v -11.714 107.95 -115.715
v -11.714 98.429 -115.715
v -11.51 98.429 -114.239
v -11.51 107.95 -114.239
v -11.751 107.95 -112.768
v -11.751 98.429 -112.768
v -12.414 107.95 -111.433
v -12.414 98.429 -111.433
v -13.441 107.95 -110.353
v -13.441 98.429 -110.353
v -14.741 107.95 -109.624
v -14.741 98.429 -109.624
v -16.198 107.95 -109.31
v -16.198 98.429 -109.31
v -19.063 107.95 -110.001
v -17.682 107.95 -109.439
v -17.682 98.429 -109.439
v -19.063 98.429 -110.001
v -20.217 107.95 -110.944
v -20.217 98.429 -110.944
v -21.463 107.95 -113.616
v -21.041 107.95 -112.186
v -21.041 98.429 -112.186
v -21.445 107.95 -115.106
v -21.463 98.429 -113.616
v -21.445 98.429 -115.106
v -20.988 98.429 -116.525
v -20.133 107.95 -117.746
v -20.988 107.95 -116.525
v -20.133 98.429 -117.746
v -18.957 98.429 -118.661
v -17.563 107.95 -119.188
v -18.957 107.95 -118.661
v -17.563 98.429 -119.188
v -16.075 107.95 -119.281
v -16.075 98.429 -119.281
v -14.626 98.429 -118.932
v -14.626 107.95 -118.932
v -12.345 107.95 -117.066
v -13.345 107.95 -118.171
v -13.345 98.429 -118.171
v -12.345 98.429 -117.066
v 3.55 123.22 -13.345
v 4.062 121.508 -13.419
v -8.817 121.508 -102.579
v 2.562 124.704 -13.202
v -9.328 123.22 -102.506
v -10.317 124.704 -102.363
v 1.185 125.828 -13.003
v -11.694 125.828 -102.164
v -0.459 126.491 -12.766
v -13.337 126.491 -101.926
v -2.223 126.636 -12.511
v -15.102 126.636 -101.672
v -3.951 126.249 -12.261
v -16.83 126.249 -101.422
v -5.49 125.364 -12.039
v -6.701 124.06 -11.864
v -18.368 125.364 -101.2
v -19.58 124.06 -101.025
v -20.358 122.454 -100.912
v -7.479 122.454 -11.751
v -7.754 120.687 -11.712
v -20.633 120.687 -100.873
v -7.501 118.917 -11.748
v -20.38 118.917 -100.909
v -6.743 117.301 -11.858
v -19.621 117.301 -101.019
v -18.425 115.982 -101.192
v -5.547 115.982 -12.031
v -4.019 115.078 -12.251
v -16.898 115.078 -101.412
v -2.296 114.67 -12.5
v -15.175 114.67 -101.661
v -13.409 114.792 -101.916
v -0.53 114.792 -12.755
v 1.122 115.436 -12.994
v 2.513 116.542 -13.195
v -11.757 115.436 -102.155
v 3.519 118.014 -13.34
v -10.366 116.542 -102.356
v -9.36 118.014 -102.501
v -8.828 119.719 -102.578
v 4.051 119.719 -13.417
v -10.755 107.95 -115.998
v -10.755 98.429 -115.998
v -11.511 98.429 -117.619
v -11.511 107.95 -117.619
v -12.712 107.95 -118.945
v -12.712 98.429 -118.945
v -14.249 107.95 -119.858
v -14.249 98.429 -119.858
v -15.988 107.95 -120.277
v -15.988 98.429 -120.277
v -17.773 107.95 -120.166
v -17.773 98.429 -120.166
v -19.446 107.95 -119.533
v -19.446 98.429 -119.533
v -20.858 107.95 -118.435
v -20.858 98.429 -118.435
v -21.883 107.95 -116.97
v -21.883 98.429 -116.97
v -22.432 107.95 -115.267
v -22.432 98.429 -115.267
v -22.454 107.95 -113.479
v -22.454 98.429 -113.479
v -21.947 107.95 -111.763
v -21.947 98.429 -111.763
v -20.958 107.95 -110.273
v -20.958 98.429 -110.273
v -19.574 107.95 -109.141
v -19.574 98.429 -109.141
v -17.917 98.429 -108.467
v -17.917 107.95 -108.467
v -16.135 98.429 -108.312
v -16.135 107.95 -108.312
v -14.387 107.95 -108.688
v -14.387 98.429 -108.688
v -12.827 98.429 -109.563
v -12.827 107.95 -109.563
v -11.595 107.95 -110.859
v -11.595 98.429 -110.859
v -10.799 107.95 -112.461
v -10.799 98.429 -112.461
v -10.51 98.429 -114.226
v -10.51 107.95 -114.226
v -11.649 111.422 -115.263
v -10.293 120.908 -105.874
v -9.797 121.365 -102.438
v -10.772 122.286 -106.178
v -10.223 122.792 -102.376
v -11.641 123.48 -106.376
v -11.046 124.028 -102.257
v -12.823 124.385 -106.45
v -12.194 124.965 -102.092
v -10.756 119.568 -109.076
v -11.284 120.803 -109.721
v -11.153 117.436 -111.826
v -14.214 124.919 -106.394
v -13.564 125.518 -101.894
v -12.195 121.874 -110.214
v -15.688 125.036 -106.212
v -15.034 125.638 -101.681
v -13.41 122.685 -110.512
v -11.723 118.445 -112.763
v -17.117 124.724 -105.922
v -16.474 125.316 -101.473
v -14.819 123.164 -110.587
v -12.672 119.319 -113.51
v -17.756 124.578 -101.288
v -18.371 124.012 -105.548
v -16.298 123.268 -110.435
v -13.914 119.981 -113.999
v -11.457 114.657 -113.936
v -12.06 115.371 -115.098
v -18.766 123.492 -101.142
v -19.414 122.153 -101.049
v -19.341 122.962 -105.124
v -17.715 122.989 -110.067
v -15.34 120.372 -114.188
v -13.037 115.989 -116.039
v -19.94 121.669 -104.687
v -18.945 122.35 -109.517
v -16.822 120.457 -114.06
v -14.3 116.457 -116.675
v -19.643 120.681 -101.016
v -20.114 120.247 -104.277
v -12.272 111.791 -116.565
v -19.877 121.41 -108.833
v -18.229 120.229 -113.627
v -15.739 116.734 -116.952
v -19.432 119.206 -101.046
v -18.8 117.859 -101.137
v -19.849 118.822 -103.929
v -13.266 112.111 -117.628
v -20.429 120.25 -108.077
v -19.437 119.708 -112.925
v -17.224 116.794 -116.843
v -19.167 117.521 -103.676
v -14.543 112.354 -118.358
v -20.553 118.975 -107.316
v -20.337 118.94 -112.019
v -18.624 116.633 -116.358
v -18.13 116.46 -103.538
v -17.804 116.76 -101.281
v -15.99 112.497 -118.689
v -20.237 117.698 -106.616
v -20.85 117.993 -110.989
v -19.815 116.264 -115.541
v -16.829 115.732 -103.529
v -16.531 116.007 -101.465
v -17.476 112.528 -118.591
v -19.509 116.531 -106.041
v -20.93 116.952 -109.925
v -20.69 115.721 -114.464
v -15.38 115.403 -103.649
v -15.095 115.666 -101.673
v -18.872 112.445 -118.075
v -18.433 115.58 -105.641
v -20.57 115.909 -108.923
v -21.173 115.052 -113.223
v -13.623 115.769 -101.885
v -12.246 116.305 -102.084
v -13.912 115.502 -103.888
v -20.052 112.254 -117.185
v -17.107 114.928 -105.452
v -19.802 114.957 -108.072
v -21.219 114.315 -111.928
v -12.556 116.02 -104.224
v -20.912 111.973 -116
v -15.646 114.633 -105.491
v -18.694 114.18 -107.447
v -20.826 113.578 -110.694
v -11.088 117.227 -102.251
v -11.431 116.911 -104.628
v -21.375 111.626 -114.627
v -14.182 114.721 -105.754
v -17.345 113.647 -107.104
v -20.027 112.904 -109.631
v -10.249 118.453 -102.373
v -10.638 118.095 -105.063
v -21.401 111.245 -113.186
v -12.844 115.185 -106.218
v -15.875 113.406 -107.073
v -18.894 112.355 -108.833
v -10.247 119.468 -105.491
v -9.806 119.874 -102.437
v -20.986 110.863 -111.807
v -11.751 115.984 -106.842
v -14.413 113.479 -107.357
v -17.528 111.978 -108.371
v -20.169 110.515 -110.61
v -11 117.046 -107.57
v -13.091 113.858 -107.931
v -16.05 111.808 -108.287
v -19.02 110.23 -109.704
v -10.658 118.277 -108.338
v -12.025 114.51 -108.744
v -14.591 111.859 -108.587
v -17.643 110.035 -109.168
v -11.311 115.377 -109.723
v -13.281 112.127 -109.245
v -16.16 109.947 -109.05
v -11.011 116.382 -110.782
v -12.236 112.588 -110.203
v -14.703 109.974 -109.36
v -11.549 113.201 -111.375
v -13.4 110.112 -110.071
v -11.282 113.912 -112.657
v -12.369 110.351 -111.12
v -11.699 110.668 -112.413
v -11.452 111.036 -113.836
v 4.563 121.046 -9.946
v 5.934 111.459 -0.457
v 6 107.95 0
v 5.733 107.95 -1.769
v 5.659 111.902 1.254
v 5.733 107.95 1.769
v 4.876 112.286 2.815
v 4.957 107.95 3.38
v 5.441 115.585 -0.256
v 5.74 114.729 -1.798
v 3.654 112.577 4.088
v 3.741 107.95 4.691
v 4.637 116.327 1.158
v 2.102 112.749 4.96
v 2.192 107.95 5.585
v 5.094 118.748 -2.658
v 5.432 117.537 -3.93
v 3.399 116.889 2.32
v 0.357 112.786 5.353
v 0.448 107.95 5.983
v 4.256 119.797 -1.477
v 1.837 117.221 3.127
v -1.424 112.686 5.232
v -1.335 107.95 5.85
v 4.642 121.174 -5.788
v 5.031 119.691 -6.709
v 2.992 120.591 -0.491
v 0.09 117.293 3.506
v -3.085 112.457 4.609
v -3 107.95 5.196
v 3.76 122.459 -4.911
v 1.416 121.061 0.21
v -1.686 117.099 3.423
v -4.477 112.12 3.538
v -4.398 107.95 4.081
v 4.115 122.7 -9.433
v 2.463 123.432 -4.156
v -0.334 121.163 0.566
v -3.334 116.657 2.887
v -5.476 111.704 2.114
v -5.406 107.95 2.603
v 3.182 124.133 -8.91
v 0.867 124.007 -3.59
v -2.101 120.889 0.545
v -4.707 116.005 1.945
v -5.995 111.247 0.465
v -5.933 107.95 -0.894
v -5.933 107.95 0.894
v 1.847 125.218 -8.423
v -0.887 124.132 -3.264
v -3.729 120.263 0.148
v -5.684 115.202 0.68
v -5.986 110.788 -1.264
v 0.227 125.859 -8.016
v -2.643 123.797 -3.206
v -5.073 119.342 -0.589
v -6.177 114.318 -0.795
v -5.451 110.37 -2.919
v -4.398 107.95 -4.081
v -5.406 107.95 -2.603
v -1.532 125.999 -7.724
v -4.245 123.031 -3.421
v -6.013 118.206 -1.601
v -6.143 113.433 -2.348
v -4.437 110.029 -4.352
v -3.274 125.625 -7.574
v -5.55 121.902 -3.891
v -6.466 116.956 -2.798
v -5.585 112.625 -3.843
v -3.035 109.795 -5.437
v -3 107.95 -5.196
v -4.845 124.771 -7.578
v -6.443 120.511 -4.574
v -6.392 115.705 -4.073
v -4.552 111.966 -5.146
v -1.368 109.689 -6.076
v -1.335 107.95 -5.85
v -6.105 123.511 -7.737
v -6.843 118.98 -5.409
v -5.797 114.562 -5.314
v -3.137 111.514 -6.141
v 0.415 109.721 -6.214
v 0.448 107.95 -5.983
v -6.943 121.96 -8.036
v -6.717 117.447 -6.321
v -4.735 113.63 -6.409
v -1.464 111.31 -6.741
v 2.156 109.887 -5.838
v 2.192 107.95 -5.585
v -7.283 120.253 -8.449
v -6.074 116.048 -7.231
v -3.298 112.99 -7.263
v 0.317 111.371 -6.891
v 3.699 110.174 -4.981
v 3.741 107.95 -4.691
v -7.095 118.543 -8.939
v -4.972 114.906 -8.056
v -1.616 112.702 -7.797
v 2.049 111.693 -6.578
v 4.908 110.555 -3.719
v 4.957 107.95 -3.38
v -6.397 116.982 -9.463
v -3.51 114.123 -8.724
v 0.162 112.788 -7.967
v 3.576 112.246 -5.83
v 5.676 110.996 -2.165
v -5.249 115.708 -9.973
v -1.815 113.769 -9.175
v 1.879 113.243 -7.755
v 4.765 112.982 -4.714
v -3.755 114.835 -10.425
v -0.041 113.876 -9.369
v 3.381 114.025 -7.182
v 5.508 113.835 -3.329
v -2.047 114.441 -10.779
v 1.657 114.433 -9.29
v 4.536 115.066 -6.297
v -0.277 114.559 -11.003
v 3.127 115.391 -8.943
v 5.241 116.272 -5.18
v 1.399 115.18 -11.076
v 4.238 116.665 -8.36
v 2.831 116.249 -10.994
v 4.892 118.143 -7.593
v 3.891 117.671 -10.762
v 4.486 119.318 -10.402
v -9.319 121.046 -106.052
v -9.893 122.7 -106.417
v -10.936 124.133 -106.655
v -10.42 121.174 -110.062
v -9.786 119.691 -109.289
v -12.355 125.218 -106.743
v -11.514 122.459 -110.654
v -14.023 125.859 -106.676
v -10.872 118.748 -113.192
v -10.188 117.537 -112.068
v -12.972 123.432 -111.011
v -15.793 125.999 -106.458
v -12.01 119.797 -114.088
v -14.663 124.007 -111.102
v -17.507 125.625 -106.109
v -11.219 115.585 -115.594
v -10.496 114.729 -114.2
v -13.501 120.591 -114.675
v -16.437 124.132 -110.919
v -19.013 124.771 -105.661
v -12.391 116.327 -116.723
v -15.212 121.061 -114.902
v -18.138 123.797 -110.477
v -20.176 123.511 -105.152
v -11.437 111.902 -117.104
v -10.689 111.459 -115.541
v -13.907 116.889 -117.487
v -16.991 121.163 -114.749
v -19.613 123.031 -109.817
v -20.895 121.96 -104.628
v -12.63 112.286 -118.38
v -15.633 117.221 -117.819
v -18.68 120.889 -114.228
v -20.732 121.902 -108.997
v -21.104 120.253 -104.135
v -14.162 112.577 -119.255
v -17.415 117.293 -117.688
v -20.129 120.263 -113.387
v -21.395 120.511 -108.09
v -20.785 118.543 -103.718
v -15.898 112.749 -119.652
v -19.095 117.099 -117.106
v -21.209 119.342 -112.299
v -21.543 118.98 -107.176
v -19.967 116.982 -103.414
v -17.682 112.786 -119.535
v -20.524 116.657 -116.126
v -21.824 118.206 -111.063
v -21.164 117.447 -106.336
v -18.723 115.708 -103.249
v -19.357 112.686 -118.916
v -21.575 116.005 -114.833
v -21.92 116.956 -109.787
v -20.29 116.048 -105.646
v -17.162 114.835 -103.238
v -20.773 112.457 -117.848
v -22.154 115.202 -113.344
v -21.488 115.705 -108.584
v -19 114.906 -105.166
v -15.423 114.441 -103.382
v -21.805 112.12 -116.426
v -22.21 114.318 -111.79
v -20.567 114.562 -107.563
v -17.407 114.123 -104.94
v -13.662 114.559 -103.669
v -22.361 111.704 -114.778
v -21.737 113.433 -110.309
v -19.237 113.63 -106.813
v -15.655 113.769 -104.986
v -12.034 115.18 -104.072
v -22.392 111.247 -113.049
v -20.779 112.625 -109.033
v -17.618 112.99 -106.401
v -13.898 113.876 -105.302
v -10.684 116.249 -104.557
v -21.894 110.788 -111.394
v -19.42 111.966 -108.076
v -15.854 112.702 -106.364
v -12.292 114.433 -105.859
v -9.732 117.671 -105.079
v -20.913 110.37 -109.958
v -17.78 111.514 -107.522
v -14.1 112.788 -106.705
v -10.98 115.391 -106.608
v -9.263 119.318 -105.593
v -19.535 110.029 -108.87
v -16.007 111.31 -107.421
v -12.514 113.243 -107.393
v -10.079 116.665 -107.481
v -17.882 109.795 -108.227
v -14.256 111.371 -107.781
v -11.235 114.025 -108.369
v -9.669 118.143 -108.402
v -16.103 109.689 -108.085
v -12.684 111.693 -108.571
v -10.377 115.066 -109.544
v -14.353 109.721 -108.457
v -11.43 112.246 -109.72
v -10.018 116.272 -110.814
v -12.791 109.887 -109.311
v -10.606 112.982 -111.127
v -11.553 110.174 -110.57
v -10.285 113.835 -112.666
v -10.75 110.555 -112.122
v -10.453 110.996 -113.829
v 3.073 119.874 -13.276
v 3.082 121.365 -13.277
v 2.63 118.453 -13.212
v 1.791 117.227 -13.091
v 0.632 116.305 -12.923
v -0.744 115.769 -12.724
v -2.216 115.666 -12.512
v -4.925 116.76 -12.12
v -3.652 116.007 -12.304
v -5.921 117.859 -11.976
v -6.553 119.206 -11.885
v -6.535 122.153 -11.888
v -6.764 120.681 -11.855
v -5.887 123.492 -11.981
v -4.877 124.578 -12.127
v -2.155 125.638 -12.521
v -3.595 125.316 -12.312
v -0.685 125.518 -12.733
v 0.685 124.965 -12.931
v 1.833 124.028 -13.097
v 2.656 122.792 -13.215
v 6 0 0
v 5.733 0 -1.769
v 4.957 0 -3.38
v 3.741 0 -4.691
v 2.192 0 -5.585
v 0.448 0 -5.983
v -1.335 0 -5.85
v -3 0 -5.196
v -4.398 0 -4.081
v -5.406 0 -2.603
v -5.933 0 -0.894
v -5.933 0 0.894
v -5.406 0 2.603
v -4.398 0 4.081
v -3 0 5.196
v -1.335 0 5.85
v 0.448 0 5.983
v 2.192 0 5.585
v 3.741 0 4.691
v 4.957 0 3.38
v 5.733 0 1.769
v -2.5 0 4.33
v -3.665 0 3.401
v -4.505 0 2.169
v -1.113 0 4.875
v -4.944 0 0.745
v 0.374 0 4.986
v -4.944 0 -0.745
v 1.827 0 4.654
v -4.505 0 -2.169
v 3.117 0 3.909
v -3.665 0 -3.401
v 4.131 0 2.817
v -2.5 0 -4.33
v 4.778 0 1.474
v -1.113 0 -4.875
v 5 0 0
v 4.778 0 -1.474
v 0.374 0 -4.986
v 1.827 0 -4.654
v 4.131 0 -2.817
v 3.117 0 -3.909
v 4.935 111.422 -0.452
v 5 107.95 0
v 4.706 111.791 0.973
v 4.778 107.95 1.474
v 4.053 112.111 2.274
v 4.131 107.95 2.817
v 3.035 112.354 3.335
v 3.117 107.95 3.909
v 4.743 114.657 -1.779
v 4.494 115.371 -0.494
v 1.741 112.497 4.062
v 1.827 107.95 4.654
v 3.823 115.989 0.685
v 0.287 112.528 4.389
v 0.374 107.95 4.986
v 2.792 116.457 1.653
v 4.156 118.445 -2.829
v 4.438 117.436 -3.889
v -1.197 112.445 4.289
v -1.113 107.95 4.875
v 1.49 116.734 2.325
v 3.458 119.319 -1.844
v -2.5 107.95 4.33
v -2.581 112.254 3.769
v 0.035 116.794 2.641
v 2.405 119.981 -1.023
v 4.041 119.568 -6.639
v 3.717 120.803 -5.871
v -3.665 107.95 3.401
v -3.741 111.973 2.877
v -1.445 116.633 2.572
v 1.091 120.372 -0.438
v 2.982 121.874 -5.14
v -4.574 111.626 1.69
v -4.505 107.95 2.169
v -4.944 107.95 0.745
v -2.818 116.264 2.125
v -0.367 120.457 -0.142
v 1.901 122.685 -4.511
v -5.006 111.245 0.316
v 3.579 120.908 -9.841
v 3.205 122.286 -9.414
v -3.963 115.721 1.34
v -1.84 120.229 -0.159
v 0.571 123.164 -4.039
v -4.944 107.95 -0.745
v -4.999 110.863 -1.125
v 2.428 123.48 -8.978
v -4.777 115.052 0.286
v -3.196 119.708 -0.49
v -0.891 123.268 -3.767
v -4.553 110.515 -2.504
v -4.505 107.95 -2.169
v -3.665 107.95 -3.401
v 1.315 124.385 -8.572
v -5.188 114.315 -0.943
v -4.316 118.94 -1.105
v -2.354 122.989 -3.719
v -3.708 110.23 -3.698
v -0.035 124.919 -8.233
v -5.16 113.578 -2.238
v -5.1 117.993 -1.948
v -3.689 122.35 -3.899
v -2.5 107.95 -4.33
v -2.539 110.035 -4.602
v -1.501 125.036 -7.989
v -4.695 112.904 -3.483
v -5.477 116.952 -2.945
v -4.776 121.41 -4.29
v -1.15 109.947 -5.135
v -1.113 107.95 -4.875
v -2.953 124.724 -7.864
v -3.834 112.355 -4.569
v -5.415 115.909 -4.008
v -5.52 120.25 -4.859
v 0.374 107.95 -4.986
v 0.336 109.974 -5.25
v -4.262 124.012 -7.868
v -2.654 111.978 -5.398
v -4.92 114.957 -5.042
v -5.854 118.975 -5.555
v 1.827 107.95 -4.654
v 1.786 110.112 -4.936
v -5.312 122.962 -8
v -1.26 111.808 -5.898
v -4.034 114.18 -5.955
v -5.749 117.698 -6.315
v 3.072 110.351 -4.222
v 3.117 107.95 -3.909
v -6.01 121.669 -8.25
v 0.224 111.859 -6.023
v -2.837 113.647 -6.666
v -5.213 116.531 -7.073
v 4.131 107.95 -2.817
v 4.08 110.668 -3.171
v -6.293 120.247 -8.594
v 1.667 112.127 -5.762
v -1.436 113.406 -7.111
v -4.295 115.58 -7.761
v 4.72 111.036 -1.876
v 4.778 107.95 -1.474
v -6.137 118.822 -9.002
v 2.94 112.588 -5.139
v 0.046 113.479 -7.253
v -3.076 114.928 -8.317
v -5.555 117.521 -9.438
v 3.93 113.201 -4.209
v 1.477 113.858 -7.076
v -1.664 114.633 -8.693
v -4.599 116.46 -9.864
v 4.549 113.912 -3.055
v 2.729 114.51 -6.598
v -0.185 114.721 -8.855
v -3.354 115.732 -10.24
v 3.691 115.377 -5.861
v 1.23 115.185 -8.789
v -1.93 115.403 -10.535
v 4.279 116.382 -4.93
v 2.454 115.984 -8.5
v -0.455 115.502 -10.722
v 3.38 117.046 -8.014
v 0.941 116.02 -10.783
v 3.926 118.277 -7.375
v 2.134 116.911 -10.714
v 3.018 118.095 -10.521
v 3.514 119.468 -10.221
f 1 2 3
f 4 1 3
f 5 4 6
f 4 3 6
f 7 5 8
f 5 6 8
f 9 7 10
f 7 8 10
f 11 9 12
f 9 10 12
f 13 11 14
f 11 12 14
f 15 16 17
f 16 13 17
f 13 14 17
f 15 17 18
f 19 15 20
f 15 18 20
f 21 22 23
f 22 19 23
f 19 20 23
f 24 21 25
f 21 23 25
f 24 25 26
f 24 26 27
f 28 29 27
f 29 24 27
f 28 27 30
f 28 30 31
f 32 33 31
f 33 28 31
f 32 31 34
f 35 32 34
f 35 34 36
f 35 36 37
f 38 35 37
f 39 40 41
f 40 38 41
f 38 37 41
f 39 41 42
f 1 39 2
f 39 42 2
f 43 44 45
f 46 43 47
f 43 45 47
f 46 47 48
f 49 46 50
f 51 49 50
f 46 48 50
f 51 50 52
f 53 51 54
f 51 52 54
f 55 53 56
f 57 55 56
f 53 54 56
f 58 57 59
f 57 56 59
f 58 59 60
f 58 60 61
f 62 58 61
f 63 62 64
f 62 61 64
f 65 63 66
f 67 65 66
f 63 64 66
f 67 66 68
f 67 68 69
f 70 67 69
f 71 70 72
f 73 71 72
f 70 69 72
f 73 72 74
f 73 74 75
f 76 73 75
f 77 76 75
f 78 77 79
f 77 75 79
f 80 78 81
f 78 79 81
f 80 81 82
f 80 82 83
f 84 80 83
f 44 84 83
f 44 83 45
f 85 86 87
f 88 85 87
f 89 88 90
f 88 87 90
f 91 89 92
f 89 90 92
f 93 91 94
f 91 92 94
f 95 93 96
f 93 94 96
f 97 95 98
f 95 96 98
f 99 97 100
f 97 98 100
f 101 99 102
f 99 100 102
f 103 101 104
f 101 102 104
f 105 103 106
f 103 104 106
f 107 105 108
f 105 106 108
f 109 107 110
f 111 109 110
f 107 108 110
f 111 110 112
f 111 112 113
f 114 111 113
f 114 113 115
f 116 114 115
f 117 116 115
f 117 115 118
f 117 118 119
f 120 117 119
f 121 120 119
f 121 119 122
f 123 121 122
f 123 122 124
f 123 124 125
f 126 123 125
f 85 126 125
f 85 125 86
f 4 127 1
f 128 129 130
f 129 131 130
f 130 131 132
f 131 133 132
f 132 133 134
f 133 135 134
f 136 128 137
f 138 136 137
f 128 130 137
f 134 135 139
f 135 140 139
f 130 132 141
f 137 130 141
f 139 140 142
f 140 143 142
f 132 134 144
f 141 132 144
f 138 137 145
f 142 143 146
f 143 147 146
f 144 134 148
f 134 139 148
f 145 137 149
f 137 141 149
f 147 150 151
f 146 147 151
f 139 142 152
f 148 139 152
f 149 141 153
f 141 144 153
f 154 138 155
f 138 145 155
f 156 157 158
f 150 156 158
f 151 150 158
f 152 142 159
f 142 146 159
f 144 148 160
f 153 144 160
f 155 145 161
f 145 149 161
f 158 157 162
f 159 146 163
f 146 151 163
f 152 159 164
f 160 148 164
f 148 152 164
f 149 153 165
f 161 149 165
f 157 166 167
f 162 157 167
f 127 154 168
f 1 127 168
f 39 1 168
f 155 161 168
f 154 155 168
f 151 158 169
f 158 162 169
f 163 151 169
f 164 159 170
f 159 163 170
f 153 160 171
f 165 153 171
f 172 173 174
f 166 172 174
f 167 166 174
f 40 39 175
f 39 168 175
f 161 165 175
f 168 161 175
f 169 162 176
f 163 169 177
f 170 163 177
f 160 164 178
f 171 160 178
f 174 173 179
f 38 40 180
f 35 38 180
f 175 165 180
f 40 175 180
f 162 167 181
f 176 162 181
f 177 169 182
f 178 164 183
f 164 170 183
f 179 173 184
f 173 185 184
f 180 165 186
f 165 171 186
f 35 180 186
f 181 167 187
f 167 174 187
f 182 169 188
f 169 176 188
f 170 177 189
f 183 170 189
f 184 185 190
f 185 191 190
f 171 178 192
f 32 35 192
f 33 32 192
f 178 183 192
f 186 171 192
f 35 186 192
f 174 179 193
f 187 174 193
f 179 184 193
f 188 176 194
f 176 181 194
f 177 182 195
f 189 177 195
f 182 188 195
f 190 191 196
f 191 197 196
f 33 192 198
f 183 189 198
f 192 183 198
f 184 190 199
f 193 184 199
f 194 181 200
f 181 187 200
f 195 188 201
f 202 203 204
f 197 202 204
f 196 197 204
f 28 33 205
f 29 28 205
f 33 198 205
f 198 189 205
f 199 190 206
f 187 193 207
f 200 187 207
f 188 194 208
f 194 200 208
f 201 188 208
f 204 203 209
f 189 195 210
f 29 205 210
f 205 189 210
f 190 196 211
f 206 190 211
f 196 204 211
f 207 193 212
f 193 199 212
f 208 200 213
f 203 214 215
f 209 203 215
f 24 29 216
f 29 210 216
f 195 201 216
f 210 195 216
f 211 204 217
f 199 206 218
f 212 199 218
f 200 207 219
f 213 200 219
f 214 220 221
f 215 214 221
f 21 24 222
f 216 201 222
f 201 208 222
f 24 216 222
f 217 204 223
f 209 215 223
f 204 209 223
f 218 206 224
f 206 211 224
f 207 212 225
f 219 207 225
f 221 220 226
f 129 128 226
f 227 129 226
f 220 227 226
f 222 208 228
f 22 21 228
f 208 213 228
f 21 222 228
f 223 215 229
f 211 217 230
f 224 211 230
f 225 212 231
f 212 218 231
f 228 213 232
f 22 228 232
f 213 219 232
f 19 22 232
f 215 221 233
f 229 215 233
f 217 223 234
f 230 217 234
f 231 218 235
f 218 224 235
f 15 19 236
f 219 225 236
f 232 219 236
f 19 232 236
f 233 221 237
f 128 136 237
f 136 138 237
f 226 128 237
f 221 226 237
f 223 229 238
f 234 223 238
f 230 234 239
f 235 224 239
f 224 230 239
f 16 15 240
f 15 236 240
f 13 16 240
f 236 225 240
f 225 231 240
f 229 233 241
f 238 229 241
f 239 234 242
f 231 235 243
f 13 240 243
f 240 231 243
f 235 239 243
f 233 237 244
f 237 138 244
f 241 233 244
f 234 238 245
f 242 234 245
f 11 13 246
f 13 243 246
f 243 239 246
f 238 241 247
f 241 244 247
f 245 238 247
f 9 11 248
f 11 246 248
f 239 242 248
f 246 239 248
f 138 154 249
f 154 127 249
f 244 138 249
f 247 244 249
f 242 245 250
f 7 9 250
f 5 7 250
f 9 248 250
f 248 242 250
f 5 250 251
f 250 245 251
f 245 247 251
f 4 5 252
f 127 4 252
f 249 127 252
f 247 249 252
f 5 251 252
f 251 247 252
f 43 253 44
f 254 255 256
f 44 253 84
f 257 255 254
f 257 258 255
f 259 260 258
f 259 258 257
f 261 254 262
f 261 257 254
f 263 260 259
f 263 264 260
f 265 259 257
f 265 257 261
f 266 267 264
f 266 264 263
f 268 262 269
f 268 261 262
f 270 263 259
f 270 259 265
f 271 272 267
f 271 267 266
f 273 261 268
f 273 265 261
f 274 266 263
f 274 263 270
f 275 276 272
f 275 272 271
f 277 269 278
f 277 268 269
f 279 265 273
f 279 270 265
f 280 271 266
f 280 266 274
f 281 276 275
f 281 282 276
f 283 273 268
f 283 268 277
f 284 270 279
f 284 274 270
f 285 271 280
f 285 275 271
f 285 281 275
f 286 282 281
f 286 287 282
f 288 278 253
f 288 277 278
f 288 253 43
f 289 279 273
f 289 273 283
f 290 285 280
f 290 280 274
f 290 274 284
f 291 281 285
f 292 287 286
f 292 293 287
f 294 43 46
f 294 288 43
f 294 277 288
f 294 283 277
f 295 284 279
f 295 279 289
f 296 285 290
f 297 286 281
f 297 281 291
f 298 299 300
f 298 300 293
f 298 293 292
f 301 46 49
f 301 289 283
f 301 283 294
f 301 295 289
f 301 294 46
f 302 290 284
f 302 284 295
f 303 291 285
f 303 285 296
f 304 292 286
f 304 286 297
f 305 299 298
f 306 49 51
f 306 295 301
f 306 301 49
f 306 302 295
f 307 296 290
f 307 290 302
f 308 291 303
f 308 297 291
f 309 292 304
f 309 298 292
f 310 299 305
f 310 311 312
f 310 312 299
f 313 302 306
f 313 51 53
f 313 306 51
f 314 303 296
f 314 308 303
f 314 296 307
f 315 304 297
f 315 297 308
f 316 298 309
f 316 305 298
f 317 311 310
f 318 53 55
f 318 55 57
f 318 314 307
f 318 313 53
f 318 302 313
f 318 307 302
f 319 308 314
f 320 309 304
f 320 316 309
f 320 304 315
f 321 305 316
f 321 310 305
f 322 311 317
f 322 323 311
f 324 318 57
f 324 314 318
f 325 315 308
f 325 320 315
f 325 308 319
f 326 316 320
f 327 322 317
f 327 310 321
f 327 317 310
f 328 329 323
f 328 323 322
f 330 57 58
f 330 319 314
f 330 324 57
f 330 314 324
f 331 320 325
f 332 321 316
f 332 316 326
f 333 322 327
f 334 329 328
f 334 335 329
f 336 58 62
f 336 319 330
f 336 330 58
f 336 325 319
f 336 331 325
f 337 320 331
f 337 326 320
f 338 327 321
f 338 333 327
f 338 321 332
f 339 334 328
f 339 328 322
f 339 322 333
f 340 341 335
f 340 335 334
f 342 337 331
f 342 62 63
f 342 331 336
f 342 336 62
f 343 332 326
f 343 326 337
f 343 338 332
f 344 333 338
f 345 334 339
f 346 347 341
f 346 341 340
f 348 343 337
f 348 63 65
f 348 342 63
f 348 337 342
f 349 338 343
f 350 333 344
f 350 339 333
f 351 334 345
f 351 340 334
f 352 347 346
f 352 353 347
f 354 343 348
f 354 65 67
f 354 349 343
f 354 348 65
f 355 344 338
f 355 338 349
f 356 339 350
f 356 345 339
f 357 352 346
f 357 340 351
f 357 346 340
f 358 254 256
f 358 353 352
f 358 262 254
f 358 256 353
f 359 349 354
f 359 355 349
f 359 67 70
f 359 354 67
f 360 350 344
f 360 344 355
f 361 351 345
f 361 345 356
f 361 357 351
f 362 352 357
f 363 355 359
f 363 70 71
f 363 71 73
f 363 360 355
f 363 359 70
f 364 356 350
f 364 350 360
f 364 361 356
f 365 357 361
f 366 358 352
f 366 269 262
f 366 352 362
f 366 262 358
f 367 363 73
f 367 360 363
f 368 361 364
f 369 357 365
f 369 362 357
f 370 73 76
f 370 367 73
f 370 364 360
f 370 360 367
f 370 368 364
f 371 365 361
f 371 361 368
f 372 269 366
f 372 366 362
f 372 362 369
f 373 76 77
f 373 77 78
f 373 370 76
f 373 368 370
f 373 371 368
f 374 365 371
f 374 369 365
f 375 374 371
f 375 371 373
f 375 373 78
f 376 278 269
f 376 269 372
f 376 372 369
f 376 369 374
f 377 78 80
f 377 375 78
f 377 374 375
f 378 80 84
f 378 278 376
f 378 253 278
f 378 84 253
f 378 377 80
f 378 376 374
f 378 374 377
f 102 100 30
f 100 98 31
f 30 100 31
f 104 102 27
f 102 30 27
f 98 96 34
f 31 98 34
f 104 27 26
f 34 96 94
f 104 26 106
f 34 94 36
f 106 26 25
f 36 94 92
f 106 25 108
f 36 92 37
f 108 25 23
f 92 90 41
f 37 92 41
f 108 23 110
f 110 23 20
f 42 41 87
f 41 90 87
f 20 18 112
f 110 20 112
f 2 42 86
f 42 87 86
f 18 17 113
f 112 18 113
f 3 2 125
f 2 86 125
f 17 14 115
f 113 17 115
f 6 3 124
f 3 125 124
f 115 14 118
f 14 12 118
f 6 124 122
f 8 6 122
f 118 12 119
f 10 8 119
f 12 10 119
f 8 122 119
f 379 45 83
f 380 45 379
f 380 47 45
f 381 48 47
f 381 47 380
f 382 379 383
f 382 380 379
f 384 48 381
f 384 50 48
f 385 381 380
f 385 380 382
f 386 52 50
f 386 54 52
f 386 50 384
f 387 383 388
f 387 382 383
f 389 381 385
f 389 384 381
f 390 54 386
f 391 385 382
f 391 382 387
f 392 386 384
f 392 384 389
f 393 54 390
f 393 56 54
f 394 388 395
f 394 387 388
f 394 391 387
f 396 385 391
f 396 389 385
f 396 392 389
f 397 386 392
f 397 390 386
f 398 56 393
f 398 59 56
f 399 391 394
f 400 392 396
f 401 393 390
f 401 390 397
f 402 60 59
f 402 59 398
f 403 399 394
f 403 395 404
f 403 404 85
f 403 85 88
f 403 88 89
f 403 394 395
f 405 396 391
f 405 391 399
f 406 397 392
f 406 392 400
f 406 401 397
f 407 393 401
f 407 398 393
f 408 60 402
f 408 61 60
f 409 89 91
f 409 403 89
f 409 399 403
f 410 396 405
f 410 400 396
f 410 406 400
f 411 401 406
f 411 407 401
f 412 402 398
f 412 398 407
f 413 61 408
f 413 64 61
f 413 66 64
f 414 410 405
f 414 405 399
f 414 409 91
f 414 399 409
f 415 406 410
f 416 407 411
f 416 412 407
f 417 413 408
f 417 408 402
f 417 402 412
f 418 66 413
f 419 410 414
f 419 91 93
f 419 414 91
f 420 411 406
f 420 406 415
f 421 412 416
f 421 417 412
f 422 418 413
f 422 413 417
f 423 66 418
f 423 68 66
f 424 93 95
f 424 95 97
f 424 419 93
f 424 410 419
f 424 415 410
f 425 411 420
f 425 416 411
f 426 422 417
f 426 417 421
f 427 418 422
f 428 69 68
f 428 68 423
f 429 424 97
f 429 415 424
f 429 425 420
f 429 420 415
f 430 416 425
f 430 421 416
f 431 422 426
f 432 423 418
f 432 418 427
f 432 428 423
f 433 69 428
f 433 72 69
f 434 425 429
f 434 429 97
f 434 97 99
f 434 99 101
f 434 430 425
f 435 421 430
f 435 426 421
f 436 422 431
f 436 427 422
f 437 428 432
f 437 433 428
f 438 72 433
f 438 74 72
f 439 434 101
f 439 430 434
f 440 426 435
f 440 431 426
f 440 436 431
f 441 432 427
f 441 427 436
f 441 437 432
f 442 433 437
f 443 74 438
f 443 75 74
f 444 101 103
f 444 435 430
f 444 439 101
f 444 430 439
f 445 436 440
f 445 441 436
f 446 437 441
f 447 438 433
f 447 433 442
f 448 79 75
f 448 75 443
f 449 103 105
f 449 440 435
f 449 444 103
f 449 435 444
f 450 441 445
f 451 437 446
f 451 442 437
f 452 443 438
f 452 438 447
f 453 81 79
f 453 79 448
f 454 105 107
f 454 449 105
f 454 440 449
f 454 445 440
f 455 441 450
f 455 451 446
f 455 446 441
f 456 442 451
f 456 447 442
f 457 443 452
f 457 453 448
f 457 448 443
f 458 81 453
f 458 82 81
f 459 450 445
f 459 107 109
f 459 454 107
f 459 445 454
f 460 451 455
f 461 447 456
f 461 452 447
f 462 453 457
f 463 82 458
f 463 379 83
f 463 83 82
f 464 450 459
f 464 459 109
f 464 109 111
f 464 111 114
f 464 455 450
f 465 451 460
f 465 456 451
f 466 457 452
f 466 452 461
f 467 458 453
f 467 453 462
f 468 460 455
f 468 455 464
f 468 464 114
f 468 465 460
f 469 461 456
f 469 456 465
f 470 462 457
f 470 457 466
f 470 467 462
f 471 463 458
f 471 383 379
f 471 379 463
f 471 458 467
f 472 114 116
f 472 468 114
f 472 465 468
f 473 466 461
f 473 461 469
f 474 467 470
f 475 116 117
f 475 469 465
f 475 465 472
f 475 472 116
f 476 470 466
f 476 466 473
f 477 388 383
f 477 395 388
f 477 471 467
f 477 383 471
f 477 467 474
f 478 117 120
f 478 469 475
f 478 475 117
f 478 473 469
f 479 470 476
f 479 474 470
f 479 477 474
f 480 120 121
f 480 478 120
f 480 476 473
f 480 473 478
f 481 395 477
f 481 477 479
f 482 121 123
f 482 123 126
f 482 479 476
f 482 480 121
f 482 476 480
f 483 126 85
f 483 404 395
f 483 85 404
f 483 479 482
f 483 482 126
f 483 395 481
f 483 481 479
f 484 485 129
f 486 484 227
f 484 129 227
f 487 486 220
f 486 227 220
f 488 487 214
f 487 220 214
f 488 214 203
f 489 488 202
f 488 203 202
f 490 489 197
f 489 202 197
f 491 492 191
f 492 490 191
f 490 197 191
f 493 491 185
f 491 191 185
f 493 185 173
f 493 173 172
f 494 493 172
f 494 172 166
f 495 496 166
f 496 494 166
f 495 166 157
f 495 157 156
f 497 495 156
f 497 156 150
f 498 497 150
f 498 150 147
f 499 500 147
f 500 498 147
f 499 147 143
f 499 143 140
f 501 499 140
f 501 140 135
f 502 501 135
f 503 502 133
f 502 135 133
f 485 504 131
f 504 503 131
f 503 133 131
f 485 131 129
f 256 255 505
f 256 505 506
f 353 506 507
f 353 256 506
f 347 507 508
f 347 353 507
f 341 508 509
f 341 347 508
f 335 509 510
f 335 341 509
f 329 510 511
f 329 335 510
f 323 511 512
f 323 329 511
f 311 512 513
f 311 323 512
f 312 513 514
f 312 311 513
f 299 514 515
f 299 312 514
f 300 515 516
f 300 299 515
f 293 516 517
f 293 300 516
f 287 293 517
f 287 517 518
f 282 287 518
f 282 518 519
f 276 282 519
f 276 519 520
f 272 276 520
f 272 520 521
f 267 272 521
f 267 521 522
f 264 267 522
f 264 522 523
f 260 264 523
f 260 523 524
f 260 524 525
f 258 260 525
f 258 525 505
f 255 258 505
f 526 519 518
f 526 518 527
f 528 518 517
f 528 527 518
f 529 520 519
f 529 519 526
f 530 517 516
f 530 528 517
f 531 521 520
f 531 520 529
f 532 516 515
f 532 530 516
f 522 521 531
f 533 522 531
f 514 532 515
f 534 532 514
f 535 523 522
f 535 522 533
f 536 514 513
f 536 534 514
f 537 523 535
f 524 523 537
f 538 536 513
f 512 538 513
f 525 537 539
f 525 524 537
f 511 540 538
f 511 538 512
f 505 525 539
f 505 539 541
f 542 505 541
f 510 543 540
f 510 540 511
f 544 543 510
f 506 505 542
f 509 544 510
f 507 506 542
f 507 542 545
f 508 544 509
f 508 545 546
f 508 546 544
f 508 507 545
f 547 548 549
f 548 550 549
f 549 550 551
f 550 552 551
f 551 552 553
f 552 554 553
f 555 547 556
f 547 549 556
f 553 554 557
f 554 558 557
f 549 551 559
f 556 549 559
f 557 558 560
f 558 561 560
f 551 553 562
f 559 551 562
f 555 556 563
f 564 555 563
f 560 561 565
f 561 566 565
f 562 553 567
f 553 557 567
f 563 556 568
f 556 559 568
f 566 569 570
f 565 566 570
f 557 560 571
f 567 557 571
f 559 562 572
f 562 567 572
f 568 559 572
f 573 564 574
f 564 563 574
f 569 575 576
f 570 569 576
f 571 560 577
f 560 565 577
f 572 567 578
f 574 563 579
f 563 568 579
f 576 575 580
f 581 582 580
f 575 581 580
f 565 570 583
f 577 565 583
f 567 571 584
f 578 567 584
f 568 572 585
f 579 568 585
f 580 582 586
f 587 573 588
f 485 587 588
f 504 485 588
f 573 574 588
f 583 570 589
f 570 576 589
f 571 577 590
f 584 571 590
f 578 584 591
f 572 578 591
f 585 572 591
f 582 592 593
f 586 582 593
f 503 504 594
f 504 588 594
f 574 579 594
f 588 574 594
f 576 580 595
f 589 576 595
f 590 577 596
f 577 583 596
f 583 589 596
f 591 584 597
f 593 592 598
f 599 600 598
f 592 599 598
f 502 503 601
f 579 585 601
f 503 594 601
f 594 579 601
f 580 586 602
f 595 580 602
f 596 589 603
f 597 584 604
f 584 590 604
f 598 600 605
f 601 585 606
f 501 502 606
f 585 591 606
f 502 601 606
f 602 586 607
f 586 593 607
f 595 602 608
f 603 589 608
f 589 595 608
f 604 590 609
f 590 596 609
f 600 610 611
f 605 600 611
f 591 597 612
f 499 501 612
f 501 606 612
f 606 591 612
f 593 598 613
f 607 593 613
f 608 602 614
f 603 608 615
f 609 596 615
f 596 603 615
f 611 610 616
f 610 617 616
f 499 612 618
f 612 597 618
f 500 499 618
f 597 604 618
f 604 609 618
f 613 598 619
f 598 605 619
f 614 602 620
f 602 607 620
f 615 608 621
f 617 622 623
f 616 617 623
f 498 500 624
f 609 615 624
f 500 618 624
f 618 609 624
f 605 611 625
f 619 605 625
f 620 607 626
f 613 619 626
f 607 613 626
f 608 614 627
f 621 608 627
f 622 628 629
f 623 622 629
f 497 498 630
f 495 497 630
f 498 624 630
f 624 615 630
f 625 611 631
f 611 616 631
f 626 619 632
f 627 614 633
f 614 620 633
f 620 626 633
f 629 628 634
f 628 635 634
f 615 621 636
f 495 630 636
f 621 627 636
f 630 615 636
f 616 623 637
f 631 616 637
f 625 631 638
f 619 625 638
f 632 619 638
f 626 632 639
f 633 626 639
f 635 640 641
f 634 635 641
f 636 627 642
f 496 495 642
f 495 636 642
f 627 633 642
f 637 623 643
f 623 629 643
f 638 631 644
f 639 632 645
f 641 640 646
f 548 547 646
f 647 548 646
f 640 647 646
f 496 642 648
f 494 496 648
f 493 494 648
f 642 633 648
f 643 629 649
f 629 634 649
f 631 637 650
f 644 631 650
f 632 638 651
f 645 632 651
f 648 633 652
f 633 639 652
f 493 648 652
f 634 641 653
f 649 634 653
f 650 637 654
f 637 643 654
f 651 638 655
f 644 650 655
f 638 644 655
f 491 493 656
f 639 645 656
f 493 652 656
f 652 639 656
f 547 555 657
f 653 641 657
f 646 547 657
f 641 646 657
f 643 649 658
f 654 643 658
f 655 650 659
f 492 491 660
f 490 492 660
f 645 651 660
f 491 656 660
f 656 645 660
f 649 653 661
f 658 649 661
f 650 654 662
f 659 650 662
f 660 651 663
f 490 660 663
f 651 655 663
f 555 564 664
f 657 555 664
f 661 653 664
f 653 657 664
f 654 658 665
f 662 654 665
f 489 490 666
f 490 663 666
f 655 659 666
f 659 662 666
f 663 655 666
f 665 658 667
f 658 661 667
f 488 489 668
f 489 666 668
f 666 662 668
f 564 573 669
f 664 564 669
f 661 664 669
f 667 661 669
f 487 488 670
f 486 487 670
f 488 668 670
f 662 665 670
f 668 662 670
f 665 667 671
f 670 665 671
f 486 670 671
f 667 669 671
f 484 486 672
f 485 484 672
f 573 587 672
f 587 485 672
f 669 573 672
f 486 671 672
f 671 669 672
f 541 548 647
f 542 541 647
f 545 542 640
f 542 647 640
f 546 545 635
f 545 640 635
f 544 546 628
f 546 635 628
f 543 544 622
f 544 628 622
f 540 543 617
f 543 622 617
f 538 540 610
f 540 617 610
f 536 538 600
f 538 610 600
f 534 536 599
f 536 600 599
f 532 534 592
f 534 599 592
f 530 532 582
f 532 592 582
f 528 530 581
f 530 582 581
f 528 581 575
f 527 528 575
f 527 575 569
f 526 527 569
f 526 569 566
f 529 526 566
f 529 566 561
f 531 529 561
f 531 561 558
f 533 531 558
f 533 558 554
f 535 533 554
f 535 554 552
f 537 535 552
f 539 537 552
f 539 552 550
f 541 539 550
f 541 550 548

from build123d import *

# Parameters (mm, degrees)
F0_R   = 6
F0_R_2 = 5


with BuildPart() as f3:
    # F3: sweep along a path in F2
    with BuildLine(Plane(origin=(0, 0, 0), x_dir=(0, -1, 0), z_dir=(-0.989728, 0, 0.142961))) as f3_path:
        Line((0, 0), (-107.95, 0))
        ThreePointArc((-107.95, 0), (-116.930256, -3.719744), (-120.65, -12.7))
        Line((-120.65, -12.7), (-120.65, -102.786233))
        ThreePointArc((-120.65, -102.786233), (-116.930256, -111.766489), (-107.95, -115.486233))
        Line((-107.95, -115.486233), (-98.428674, -115.486233))
    # F0 (on Front) → F3 (sweep)
    with BuildSketch(Plane.XZ):
        Circle(F0_R)
        Circle(F0_R_2, mode=Mode.SUBTRACT)
    sweep(path=f3_path.line)


solid = f3.part
